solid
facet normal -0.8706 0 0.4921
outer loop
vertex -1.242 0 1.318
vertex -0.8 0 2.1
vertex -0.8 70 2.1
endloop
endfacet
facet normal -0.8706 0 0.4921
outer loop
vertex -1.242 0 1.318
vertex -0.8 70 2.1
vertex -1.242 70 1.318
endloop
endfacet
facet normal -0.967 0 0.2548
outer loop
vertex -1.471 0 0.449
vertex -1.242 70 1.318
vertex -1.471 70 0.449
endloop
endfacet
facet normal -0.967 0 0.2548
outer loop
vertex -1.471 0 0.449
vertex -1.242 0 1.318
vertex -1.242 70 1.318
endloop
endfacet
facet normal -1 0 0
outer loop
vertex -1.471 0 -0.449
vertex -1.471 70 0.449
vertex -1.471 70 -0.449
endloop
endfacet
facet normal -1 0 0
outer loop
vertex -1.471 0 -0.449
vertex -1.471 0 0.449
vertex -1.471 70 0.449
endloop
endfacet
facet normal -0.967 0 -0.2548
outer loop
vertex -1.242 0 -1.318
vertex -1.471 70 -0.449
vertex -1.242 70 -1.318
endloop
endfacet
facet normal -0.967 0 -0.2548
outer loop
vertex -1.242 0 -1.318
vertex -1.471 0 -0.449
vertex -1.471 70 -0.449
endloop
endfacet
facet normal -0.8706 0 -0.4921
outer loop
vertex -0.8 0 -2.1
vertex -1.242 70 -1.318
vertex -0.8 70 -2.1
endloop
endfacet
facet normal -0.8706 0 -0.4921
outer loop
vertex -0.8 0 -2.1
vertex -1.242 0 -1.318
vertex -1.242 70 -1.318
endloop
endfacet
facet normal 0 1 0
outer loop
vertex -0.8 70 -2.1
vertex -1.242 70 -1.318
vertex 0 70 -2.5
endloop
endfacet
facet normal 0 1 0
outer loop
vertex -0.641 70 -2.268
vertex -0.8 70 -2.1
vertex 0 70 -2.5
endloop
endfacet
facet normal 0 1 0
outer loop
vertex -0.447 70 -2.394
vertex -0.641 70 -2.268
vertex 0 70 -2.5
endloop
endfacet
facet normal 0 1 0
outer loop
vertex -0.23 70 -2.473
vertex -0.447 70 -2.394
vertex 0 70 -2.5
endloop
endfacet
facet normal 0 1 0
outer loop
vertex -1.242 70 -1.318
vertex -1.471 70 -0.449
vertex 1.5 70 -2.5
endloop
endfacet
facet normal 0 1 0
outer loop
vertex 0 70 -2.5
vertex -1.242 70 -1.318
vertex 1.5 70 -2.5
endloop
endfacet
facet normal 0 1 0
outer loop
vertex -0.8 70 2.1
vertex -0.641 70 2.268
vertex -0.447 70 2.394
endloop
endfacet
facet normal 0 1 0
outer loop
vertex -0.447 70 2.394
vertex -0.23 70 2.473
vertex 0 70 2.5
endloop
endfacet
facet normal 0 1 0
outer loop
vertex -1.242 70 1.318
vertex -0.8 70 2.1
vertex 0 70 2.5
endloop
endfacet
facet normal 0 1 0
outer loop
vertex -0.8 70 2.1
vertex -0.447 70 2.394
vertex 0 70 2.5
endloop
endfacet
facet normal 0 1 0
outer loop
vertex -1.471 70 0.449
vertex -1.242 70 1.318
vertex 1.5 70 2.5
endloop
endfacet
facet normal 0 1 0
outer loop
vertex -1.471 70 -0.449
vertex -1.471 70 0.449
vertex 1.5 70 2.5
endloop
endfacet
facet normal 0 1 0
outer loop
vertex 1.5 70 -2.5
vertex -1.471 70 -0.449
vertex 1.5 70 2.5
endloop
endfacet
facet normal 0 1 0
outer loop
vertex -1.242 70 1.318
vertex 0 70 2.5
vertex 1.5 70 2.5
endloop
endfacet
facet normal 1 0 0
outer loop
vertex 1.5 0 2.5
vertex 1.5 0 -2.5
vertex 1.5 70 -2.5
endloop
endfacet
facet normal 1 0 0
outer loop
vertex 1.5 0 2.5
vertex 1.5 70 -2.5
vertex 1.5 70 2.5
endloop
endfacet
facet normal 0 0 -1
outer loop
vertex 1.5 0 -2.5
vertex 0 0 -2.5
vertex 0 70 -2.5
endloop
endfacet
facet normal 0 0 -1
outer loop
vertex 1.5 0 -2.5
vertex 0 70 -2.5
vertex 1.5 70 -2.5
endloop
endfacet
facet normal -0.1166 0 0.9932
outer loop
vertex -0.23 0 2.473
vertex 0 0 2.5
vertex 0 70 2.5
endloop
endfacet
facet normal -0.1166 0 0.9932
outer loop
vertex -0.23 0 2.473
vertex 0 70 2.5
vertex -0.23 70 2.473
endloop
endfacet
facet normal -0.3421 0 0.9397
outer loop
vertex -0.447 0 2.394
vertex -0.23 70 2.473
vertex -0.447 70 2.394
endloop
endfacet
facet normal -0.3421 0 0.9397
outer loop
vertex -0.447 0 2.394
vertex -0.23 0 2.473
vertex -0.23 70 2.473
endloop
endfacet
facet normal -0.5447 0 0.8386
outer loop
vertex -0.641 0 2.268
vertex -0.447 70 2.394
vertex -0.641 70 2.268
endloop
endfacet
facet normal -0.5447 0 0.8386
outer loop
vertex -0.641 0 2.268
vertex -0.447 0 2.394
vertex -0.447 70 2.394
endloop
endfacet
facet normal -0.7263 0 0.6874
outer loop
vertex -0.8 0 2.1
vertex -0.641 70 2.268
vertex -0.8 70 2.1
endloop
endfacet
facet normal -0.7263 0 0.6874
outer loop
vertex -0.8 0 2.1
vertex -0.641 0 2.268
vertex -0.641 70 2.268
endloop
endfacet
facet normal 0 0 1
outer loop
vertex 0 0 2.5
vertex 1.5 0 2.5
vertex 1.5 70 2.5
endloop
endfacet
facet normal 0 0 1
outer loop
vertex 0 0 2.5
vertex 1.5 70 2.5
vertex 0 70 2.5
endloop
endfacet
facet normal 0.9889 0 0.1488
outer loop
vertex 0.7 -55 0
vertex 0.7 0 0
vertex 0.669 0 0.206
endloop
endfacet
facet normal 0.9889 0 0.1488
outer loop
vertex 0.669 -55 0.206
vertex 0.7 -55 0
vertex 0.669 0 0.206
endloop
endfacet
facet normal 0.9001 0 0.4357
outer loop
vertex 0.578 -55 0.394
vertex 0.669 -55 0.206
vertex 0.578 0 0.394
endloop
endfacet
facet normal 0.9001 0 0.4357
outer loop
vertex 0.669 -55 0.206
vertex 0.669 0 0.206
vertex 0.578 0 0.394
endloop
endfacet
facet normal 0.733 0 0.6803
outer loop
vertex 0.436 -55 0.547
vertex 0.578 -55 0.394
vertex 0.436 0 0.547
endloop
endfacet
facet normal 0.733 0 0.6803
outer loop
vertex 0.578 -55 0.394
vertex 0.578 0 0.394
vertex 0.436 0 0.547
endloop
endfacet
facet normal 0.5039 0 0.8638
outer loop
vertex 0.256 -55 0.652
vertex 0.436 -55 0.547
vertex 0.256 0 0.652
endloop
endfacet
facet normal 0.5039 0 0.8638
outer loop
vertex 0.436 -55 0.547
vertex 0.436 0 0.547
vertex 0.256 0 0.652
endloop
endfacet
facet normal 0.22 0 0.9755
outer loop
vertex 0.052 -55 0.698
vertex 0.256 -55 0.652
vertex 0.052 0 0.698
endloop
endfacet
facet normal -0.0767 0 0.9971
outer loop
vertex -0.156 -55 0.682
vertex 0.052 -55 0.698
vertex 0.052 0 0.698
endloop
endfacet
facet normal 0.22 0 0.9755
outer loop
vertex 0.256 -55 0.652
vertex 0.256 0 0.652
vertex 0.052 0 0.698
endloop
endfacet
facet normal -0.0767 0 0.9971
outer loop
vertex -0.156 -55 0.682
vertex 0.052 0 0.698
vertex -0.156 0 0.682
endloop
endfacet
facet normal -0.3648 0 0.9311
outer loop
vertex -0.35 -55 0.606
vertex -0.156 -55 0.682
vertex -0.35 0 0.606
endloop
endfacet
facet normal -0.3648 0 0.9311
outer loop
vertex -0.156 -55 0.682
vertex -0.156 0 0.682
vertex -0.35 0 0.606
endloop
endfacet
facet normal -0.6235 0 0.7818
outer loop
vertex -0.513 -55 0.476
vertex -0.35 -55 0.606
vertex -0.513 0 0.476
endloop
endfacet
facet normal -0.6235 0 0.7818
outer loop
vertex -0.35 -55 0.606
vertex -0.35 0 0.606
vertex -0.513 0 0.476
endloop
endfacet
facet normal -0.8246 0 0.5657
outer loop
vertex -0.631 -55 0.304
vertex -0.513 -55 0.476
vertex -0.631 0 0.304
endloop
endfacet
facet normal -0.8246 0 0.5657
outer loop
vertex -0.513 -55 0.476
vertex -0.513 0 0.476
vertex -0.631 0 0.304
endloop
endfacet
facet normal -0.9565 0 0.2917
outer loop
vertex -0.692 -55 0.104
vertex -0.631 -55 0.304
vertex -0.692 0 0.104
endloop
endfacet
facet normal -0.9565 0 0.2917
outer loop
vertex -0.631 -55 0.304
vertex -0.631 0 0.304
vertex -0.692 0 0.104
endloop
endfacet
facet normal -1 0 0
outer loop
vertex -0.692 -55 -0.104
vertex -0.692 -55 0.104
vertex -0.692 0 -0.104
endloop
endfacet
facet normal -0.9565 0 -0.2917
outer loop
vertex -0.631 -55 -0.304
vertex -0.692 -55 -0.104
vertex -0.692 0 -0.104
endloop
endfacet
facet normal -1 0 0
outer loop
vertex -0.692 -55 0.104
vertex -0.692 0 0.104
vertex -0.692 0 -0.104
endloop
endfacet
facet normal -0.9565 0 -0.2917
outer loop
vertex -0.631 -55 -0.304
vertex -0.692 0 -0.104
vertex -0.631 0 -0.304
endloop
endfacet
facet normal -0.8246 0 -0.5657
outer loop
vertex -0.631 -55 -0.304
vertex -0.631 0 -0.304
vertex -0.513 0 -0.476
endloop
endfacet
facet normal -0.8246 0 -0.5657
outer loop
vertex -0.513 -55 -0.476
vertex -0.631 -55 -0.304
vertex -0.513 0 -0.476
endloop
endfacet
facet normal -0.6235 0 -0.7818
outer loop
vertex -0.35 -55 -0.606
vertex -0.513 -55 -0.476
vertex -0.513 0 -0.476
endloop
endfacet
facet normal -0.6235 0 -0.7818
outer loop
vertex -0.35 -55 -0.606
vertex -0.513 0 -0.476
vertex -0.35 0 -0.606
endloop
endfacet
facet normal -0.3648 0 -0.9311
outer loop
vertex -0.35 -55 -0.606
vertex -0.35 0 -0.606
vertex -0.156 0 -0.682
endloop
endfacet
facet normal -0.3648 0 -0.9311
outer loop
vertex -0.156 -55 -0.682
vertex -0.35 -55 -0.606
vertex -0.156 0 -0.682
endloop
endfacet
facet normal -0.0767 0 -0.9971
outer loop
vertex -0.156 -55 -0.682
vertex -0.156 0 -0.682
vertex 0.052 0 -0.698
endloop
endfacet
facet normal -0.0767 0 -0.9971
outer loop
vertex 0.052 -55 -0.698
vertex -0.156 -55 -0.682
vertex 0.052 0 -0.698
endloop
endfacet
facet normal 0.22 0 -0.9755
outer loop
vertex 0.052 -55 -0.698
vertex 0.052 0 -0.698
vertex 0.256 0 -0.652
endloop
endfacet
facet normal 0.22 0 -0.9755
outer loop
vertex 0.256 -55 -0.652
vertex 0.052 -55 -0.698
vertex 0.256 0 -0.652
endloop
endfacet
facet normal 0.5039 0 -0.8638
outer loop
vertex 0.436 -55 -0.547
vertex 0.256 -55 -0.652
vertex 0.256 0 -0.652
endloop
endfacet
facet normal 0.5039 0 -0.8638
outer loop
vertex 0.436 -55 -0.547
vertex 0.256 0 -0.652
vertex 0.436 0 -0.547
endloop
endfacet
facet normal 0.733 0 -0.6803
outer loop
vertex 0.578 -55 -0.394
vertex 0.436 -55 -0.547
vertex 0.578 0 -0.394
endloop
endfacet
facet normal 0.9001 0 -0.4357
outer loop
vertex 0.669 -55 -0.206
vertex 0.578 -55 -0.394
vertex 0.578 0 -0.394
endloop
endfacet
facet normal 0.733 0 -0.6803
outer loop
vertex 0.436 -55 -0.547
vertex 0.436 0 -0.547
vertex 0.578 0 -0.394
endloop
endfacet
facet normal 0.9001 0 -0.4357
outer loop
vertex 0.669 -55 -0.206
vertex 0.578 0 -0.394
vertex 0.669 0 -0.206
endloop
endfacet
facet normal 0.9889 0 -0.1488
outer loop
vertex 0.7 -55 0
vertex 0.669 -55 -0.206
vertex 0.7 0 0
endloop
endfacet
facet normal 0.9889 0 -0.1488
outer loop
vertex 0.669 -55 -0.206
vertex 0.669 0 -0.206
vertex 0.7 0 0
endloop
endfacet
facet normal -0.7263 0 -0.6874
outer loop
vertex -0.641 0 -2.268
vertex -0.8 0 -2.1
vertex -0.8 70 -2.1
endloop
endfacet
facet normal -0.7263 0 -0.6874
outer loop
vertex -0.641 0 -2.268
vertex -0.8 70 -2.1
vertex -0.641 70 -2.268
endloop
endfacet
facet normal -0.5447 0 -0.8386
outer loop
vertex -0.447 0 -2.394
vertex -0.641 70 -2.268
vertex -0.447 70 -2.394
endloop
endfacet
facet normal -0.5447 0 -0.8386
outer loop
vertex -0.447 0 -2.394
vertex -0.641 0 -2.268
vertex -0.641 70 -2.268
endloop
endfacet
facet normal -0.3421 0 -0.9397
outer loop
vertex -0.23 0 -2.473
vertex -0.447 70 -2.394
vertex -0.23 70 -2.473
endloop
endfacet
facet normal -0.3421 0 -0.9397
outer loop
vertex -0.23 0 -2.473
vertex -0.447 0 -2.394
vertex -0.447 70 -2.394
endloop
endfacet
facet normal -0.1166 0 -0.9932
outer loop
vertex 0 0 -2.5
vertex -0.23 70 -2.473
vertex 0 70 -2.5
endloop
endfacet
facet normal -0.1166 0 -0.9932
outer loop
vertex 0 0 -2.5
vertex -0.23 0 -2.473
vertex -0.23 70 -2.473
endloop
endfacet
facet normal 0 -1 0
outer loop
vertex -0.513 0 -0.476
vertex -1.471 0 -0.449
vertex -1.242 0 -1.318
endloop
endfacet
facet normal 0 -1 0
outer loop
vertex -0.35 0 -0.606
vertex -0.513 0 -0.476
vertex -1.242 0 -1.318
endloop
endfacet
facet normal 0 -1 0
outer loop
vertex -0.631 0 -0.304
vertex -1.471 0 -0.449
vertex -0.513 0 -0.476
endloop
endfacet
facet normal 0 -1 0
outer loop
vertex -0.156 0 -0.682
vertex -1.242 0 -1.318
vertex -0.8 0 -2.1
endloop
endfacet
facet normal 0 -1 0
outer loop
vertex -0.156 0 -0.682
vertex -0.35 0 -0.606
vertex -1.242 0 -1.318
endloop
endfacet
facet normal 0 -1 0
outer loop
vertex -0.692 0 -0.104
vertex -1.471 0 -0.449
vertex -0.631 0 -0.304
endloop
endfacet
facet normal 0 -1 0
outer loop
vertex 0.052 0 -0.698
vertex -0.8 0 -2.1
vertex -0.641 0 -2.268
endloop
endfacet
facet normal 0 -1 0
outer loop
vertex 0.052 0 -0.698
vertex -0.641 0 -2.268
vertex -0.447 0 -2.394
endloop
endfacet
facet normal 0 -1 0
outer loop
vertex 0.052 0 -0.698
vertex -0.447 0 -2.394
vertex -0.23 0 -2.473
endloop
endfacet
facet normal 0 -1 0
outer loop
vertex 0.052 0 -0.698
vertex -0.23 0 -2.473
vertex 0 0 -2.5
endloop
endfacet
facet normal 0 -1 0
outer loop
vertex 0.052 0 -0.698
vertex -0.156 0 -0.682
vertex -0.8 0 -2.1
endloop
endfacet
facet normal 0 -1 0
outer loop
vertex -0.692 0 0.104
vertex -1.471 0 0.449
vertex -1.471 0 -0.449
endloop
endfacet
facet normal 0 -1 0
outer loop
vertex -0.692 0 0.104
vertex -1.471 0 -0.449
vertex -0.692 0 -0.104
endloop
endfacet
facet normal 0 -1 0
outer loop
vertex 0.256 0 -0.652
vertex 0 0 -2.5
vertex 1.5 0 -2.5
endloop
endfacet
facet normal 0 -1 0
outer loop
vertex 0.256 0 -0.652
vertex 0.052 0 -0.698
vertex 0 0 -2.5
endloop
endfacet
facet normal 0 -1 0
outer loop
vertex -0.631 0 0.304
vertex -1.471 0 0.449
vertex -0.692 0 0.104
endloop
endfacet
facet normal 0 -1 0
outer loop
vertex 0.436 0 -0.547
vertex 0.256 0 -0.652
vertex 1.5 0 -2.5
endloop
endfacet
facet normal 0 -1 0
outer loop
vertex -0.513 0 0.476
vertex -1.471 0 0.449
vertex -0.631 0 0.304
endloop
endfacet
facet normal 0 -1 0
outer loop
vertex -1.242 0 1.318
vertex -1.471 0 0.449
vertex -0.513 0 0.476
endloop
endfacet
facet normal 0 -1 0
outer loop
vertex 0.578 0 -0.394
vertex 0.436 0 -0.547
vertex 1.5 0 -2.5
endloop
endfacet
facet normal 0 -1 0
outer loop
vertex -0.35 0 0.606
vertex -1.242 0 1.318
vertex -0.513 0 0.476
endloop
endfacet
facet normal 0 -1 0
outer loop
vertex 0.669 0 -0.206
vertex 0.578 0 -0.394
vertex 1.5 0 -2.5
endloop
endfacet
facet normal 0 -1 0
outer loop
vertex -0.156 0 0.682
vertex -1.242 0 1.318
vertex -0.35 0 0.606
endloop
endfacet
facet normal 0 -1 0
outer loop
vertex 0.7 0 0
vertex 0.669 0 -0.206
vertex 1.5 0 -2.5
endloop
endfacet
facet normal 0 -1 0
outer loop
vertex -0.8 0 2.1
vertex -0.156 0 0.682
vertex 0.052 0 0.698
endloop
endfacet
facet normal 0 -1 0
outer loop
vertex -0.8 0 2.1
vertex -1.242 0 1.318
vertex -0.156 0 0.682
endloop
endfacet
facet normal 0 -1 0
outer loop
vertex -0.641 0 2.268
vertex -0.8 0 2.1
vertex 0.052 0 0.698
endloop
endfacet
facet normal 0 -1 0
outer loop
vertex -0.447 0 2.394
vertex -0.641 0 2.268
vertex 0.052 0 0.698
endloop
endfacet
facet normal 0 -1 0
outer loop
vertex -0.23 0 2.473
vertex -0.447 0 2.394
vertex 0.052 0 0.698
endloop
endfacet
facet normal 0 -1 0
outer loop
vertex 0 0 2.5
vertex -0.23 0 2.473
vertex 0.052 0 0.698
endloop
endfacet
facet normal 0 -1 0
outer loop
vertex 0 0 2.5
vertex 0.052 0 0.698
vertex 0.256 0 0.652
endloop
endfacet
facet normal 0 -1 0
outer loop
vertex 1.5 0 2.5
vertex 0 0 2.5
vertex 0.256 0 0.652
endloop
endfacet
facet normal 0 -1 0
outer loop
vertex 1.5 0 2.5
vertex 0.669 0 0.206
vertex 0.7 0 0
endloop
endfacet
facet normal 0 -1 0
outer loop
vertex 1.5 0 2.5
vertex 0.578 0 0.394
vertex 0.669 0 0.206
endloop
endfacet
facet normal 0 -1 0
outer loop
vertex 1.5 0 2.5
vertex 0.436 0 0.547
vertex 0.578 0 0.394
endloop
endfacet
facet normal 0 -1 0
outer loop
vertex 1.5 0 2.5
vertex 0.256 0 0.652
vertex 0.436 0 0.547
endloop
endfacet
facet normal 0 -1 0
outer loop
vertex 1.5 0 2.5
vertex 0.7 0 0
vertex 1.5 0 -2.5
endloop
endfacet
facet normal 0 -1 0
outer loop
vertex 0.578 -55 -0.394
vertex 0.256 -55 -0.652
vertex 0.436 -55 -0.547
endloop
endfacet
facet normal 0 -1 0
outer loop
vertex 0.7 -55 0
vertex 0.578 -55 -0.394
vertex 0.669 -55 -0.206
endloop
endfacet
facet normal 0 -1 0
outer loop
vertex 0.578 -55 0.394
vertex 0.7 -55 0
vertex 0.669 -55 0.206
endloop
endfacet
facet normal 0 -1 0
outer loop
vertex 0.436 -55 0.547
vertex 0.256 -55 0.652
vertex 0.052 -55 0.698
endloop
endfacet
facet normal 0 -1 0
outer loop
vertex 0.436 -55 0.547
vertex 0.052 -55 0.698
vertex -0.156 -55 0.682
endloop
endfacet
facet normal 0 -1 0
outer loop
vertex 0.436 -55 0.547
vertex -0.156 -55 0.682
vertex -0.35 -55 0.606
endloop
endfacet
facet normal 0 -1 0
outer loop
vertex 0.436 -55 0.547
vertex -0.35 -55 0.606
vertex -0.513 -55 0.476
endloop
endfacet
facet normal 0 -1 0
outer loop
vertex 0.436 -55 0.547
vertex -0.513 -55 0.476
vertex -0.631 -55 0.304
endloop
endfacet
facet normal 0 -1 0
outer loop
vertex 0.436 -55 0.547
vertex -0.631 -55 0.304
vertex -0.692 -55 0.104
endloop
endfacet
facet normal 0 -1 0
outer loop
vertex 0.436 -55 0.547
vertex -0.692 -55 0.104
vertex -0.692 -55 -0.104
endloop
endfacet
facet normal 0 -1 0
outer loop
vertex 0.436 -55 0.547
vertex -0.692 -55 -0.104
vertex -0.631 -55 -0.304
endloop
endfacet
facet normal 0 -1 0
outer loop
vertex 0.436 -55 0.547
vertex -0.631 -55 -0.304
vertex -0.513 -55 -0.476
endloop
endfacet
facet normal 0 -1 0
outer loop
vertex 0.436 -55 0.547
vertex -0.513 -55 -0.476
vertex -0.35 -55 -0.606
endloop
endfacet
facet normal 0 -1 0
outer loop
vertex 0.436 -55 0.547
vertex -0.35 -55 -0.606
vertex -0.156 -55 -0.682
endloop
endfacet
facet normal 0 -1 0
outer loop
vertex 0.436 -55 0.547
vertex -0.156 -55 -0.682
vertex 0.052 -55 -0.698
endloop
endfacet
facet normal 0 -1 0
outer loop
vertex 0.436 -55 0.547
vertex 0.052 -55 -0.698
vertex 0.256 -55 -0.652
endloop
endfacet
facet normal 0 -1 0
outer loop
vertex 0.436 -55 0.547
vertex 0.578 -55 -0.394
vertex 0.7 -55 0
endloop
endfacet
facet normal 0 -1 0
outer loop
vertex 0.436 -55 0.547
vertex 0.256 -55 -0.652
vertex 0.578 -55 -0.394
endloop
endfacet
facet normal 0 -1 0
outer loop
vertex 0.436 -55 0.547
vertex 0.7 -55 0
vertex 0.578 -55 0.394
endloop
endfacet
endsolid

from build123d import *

# Parameters (mm, degrees)
F0_R     = 0.7
F1_DEPTH = 55
F3_DEPTH = 70


# Not quite as in the source:
# - a feature of the source that left no trace in its solid (it failed there, or was rolled back) is left out


with BuildPart() as f1:
    # F0 (on Front) → F1 (new body)
    with BuildSketch(Plane.XZ):
        Circle(F0_R)
    extrude(amount=F1_DEPTH)

    # F2 (on Front) → F3 (join)
    with BuildSketch(Plane.XZ):
        with BuildLine():
            Line((1.5, -2.5), (1.5, 2.5))
            Line((1.5, 2.5), (0, 2.5))
            ThreePointArc((0, 2.5), (-0.4472135955, 2.394427191), (-0.8, 2.1))
            ThreePointArc((-0.8, 2.1), (-1.5, 0), (-0.8, -2.1))
            ThreePointArc((-0.8, -2.1), (-0.4472135955, -2.394427191), (0, -2.5))
            Line((0, -2.5), (1.5, -2.5))
        make_face()
    extrude(amount=-F3_DEPTH)


solid = f1.part
